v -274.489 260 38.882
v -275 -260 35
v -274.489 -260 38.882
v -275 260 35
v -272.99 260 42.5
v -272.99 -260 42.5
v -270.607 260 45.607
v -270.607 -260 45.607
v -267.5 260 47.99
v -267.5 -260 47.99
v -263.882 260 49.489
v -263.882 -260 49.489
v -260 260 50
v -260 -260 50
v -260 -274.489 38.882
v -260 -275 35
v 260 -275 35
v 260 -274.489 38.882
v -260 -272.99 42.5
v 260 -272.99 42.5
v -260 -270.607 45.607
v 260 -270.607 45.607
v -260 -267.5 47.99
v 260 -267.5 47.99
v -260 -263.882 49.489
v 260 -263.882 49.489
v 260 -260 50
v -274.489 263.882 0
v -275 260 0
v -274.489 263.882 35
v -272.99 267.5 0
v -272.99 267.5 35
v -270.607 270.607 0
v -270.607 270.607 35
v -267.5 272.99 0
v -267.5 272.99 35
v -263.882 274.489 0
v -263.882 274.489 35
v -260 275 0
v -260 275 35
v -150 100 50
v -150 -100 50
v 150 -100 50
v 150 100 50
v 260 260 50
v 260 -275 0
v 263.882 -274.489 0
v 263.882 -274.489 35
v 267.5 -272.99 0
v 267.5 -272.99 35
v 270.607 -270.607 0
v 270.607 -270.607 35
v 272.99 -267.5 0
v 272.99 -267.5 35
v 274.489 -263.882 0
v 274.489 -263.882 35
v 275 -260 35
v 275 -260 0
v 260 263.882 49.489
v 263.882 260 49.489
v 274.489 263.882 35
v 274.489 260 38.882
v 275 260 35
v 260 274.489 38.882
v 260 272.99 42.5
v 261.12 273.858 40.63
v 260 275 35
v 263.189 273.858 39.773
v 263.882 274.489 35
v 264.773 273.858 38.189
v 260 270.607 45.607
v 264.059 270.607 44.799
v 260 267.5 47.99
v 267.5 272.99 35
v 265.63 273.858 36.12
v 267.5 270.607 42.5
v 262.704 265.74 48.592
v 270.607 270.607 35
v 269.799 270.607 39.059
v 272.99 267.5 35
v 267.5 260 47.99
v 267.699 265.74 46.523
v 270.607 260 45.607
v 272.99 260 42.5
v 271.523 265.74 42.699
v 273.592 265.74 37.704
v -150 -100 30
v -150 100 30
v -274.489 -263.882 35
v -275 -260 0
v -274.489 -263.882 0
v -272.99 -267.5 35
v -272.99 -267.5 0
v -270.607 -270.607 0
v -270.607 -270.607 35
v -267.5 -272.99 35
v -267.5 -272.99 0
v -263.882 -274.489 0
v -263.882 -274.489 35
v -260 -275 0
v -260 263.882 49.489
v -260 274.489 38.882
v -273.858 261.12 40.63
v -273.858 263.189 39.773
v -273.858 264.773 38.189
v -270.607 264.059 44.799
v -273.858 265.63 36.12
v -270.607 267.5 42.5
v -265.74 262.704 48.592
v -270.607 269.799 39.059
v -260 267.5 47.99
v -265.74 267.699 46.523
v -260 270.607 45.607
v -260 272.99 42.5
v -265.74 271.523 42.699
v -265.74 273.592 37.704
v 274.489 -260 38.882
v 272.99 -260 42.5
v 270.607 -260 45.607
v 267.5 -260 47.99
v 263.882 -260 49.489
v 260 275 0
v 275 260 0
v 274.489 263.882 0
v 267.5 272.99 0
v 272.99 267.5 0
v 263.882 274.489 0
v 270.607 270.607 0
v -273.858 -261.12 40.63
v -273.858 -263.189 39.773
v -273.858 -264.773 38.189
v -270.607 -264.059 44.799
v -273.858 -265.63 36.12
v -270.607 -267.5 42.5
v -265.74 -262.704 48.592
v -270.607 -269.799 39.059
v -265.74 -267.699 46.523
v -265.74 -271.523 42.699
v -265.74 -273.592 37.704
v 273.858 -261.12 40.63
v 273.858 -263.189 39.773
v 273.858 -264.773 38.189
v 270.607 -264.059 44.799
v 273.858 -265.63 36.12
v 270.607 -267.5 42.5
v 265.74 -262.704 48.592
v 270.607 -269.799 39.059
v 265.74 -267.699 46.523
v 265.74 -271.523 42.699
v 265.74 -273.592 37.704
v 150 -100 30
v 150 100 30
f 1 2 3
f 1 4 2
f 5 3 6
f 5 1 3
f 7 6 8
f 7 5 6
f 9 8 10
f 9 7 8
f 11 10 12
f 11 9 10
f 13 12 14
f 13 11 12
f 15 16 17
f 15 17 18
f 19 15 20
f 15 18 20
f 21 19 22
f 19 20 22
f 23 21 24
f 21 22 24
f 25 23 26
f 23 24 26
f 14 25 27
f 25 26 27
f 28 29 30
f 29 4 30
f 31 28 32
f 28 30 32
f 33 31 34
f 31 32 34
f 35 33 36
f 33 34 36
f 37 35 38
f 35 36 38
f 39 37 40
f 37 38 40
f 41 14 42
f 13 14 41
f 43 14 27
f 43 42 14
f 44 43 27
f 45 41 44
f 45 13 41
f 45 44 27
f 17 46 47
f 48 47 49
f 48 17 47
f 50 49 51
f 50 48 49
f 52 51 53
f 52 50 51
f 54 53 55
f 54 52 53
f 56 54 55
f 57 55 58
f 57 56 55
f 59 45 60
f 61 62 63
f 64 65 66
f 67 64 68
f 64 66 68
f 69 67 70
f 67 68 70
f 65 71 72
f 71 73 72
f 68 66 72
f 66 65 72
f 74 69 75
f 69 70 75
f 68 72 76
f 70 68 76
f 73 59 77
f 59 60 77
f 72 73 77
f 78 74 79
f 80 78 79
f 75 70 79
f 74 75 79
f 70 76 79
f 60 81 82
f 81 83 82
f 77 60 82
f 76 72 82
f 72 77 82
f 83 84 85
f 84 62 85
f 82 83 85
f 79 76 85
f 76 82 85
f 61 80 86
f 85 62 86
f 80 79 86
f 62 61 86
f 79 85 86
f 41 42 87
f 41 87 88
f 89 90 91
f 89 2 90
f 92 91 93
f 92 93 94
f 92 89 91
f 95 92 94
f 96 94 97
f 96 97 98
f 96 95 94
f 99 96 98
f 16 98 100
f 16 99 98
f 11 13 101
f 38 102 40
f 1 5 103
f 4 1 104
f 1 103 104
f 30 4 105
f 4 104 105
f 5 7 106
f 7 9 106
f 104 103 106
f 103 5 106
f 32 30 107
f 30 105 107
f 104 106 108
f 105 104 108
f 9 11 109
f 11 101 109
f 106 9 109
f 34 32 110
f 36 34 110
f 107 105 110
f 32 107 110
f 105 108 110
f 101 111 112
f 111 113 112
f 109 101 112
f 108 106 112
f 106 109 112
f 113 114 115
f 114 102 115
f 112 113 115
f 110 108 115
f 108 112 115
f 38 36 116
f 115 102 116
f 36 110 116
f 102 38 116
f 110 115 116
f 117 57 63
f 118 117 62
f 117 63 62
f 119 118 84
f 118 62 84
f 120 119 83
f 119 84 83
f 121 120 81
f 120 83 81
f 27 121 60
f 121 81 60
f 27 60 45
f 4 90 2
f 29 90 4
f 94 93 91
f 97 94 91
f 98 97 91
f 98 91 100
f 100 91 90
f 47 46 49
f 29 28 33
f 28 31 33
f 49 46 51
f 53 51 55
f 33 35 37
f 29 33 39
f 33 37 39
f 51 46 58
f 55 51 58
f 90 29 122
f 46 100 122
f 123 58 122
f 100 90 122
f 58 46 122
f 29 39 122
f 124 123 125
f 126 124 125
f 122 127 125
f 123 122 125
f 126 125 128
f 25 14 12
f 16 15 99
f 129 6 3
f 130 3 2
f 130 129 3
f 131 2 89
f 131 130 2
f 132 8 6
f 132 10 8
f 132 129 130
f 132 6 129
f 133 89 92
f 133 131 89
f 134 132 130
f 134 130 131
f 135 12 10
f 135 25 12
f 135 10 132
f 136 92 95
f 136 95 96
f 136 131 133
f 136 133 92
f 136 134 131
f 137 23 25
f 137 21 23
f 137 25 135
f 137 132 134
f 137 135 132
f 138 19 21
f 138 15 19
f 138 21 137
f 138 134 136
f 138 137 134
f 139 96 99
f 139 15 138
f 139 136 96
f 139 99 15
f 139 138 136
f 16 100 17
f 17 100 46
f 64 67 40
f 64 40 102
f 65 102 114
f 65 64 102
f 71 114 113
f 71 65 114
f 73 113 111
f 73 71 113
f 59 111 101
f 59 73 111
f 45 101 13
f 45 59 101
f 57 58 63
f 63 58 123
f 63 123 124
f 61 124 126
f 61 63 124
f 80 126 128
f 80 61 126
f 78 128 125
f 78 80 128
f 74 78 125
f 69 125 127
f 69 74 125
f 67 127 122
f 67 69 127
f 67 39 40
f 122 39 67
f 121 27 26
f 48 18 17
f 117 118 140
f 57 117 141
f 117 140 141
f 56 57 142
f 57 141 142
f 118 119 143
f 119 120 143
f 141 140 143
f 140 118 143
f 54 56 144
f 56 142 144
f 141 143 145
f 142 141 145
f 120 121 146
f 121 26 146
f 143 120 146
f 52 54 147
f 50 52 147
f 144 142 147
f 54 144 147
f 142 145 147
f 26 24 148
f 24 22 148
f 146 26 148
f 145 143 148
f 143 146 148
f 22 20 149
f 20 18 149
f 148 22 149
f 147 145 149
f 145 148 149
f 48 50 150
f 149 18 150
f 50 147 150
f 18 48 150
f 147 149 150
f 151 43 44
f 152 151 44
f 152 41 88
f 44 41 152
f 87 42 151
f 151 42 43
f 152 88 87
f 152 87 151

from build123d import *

# Parameters (mm, degrees)
F0_W     = 550
F0_H     = 550
F1_DEPTH = 50
F2_R     = 15
F3_W     = 300
F3_H     = 200
F4_DEPTH = 20


with BuildPart() as f1:
    # F0 (on Top) → F1 (new body)
    with BuildSketch(Plane.XY):
        Rectangle(F0_W, F0_H)
    extrude(amount=F1_DEPTH)

    # F2
    f2_edges = [f1.edges().sort_by_distance(p)[0] for p in [
        (0, -275, 50),
        (275, 0, 50),
        (0, 275, 50),
        (-275, 0, 50),
        (275, -275, 25),
        (275, 275, 25),
        (-275, 275, 25),
        (-275, -275, 25),
    ]]
    fillet(f2_edges, radius=F2_R)

    # F3 (on face) → F4 (cut)
    with BuildSketch(Plane.XY.offset(50)):
        Rectangle(F3_W, F3_H)
    extrude(amount=-F4_DEPTH, mode=Mode.SUBTRACT)


solid = f1.part
